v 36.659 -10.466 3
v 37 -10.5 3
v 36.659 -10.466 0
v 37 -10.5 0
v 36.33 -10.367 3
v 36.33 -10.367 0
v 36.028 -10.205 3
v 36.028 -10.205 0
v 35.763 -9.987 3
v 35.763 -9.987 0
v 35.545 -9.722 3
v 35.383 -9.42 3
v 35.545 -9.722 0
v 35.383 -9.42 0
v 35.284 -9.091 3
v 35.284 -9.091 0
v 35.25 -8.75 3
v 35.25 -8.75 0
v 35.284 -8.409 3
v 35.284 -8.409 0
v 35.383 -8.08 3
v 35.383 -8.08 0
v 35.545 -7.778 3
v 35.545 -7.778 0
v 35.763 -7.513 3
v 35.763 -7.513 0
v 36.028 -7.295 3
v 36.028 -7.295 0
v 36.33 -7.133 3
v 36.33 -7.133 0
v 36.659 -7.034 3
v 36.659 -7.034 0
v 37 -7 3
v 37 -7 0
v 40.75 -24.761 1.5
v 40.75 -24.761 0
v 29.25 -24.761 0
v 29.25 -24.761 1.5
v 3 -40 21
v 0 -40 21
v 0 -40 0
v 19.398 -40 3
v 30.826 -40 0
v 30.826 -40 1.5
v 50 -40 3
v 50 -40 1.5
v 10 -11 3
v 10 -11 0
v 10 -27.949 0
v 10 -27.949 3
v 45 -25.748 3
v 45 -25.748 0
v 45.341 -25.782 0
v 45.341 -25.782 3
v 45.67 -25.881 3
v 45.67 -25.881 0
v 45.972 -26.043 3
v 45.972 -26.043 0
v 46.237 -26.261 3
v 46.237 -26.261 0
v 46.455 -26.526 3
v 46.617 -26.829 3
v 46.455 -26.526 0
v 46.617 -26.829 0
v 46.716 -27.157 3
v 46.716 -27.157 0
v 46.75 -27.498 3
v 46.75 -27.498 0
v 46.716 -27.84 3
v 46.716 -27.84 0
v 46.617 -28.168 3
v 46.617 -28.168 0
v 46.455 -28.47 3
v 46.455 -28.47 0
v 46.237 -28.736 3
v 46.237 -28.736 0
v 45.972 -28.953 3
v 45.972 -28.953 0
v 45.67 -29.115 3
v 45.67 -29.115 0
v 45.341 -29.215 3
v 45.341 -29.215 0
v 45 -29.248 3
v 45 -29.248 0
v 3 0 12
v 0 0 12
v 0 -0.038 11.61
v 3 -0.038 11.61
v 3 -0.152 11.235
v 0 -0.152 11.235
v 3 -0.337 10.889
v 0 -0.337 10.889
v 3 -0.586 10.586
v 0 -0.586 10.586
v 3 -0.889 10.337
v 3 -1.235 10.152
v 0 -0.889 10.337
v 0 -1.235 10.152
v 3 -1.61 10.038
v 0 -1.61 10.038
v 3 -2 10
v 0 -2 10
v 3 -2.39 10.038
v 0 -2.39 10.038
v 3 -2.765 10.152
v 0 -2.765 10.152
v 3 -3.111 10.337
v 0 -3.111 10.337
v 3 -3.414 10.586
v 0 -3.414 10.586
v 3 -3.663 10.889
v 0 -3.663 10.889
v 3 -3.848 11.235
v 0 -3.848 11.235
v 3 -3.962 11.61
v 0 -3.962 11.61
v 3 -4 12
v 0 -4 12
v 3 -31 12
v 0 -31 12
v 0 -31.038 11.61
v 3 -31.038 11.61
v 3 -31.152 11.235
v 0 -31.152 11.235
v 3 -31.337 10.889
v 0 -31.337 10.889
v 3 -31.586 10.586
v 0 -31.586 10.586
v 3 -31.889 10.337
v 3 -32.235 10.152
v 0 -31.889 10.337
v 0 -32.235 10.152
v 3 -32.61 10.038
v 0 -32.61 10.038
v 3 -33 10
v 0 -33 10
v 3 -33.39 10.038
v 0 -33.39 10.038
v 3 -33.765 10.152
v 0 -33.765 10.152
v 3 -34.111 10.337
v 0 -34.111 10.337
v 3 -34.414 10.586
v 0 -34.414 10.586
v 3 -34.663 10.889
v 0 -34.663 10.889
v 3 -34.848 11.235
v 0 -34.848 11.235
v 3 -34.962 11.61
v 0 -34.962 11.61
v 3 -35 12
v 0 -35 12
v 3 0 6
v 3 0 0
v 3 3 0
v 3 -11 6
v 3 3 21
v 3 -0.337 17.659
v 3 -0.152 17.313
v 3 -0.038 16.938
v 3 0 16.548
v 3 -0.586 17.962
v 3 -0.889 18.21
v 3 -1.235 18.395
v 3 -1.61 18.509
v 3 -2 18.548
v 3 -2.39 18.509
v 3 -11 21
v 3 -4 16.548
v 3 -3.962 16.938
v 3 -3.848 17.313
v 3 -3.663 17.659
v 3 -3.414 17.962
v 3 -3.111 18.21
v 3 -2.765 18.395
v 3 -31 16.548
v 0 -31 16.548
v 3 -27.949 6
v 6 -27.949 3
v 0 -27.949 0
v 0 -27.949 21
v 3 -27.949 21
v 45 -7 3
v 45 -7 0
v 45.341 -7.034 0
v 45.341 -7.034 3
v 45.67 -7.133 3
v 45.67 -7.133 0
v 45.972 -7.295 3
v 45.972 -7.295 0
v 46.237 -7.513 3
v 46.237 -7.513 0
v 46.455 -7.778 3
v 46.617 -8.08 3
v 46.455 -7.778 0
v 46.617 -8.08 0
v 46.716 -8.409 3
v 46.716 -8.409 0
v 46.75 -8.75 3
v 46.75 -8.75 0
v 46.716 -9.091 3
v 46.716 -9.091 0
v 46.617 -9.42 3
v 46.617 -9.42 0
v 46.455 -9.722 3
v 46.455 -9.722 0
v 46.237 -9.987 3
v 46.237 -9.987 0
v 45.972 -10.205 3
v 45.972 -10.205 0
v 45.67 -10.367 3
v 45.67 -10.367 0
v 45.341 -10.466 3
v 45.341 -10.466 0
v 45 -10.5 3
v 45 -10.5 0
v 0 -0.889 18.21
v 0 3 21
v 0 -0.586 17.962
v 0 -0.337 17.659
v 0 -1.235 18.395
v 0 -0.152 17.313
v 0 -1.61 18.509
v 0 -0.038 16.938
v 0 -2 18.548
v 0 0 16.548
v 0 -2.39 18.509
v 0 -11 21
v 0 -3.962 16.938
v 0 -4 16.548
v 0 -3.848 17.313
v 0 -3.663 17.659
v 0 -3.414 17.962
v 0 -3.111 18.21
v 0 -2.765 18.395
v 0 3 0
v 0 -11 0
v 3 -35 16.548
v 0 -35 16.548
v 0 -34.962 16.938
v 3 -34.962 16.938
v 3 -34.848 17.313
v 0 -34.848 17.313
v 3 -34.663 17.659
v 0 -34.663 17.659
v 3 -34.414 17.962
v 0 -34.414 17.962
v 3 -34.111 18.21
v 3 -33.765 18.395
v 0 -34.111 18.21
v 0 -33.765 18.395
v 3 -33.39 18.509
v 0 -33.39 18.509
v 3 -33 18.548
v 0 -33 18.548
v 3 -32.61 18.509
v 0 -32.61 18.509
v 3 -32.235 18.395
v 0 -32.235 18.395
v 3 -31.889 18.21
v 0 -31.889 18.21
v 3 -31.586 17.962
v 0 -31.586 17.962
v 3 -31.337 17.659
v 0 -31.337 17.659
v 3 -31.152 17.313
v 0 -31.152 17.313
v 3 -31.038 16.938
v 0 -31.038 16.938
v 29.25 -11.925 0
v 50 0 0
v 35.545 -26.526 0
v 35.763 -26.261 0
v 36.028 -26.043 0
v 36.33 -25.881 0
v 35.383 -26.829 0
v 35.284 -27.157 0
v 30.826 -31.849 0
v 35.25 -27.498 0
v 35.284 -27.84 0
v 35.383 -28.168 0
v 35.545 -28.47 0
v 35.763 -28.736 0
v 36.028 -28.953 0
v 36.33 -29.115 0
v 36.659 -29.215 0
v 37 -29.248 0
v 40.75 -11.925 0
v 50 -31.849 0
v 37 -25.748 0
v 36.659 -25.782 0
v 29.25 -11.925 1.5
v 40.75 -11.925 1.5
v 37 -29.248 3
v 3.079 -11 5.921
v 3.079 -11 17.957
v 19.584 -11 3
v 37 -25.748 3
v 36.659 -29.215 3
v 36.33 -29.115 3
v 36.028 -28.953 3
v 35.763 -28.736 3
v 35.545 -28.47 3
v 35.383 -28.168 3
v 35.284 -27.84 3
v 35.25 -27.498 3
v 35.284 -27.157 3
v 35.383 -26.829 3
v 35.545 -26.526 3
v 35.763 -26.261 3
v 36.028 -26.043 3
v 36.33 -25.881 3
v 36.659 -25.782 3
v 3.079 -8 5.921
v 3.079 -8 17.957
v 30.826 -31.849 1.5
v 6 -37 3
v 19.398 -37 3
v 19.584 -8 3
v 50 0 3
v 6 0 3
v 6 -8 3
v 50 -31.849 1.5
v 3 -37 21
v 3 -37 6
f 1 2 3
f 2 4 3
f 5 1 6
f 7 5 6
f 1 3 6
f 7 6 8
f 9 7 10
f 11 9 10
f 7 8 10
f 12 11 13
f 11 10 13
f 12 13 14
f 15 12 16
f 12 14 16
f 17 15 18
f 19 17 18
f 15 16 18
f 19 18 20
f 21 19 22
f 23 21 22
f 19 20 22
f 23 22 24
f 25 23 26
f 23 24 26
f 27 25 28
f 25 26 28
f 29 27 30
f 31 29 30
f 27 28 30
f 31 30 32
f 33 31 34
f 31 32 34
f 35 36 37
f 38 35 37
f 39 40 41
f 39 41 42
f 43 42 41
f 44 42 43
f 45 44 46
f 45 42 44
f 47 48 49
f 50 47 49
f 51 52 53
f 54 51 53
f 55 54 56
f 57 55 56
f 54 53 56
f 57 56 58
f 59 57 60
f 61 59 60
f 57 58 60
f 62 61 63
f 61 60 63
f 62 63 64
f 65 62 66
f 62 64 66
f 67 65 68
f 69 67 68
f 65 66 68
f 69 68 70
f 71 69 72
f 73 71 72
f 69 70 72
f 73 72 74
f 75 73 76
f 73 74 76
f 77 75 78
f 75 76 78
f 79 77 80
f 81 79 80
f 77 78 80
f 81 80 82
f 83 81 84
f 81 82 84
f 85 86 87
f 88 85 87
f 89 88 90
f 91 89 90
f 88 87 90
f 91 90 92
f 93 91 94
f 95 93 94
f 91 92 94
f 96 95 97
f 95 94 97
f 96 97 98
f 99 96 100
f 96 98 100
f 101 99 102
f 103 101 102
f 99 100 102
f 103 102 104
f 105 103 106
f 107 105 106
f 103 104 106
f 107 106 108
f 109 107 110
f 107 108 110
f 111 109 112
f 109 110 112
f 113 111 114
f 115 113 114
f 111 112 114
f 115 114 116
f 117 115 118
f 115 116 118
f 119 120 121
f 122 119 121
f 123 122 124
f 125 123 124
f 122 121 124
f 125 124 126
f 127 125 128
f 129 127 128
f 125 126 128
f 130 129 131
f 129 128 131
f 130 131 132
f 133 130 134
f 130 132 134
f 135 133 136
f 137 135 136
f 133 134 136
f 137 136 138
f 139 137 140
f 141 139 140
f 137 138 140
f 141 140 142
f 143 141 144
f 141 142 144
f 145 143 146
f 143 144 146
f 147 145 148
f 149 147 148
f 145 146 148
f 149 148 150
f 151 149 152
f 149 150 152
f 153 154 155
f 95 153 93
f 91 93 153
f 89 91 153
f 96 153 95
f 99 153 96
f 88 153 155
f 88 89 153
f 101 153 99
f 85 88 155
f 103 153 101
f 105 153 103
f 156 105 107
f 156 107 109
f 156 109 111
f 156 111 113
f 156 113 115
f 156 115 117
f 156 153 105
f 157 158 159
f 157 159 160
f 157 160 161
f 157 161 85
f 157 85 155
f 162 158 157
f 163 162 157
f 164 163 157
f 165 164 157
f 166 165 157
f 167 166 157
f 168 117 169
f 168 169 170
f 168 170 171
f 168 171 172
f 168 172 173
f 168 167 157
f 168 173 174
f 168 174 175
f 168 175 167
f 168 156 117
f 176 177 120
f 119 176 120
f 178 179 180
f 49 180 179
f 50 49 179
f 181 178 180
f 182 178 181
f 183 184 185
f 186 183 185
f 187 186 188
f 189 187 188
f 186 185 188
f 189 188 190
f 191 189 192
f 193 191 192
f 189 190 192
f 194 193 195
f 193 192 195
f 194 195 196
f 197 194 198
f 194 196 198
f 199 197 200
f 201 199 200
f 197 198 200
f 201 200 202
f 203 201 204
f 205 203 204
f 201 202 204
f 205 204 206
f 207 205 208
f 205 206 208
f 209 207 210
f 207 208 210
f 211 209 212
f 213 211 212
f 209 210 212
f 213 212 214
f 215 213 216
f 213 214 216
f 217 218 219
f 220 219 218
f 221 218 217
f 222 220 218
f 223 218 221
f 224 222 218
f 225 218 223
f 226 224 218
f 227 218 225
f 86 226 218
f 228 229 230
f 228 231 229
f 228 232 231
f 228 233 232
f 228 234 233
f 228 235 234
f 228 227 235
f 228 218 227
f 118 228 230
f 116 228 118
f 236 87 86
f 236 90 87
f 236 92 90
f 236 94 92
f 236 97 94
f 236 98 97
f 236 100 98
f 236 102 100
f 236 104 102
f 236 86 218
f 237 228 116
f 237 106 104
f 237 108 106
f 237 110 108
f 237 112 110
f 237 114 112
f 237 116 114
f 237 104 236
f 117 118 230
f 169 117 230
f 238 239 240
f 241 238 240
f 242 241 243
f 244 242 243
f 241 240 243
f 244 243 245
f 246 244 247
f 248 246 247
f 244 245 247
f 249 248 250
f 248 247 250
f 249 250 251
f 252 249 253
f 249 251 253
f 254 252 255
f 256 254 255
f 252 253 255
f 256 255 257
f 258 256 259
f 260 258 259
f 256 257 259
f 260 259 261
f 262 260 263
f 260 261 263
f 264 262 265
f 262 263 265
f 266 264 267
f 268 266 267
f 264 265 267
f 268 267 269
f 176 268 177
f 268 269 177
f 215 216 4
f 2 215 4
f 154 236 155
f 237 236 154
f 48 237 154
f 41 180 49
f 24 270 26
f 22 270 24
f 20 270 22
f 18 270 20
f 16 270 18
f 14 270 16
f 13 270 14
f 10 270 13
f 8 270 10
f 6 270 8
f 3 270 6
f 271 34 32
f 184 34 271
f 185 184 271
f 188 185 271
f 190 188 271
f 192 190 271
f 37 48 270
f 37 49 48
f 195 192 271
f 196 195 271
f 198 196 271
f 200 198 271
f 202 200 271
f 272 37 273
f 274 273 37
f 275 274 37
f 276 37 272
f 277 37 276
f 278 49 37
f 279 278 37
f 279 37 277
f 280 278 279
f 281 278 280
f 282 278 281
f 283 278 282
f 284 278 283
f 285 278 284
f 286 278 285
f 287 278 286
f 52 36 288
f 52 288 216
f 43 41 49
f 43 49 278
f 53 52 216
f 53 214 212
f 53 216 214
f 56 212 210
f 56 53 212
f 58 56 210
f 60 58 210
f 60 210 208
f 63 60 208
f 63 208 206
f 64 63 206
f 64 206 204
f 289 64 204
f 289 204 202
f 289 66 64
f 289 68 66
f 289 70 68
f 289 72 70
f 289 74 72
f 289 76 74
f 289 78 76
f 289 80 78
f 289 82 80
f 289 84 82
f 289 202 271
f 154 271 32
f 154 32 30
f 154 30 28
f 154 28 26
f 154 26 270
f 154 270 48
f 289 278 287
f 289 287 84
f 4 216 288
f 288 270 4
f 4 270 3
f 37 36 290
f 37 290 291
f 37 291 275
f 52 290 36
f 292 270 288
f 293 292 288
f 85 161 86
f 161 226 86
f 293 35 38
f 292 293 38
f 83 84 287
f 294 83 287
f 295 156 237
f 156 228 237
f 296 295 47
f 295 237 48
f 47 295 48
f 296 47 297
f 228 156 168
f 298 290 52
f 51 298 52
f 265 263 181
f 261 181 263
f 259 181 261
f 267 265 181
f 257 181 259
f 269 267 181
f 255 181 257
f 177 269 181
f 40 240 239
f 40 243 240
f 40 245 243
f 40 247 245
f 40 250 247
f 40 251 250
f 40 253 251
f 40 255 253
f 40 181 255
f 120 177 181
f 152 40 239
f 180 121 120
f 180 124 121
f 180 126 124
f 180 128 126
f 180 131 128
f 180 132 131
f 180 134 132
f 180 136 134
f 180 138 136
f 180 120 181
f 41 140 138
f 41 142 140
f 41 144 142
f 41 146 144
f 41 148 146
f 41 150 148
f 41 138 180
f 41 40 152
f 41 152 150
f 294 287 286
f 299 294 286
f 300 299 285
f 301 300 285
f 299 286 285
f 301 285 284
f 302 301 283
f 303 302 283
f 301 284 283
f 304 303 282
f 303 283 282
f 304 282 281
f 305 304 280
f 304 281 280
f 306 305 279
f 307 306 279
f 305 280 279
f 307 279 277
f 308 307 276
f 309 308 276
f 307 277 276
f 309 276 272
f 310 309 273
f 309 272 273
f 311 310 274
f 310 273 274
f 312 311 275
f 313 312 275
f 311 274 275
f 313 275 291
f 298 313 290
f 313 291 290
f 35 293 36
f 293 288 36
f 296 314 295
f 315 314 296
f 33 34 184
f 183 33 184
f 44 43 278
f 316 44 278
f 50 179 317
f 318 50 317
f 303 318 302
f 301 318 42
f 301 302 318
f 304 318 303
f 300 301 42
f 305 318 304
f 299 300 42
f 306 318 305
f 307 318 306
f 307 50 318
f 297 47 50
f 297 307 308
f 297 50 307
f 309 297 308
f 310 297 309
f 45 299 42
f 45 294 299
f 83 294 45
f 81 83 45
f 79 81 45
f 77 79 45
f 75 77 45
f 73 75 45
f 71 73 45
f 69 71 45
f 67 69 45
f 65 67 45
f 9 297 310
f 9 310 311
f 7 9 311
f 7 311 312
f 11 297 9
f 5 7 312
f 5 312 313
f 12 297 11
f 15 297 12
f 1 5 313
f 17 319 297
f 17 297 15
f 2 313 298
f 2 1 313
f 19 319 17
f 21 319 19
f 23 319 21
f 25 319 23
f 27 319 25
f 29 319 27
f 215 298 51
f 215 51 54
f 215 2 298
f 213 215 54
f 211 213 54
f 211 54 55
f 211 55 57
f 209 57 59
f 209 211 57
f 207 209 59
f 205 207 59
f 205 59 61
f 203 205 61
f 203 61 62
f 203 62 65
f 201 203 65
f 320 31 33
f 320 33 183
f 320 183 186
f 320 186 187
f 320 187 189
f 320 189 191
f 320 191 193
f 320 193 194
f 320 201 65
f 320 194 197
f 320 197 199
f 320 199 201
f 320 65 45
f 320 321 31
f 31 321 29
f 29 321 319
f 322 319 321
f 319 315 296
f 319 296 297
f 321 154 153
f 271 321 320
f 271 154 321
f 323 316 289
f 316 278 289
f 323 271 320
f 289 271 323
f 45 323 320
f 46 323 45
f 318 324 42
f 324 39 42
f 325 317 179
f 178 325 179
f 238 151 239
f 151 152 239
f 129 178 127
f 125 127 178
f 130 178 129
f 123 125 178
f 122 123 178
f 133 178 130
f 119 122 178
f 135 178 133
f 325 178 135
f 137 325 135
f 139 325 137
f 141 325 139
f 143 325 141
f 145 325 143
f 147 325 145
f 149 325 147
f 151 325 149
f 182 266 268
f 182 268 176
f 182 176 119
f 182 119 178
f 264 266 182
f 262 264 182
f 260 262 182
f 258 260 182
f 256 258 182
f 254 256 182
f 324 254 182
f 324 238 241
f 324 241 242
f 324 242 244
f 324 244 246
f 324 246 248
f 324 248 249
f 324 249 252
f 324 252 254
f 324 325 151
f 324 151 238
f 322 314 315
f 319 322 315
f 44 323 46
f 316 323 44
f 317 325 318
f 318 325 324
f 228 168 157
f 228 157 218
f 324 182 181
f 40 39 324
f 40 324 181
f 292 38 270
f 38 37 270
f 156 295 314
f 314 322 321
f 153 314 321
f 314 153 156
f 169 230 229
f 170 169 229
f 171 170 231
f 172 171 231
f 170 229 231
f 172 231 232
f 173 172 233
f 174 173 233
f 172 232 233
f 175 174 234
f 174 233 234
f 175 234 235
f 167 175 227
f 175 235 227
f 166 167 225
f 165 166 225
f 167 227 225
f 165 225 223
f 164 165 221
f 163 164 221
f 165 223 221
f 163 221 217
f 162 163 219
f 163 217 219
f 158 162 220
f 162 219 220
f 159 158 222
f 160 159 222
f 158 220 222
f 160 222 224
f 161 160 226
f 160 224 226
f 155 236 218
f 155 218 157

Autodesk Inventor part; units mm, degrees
ref_plane "YZ Plane" through (0, 0, 0) normal (1, 0, 0) x (0, 1, 0)
ref_plane "XZ Plane" through (0, 0, 0) normal (0, 1, 0) x (-1, 0, 0)
ref_plane "XY Plane" through (0, 0, 0) normal (0, 0, 1) x (1, 0, 0)
sketch "Sketch1" plane through (0, 0, 0) normal (0, 0, 1) x (1, 0, 0)
  line L0 (0, 0) -> (50, 0)
  line L1 (50, 0) -> (50, -40)
  line L2 (50, -40) -> (0, -40)
  line L3 (0, -40) -> (0, 0)
  dimension "d0" = 50
  dimension "d1" = 40
extrude "Extrusion1" add sketch "Sketch1" along normal blind 3
sketch "Sketch2" plane through (0, 0, 3) normal (0, 0, 1) x (1, 0, 0)
  line L0 (0, -40) -> (50, -40) projected
  line L1 (0, 0) -> (3, 0)
  line L2 (3, 0) -> (3, -40)
  line L3 (3, -40) -> (0, -40)
  line L4 (0, -40) -> (0, 0)
  dimension "d4" = 3
extrude "Extrusion2" add sketch "Sketch2" along normal blind 18
sketch "Sketch3" plane through (0, 0, 0) normal (0, 1, 0) x (1, 0, 0)
  line L0 (0, 0) -> (3, 0)
  line L1 (3, 0) -> (3, -21)
  line L2 (3, -21) -> (0, -21)
  line L3 (0, -21) -> (0, 0)
extrude "Extrusion3" add sketch "Sketch3" along normal blind 3
sketch "Sketch4" plane through (0, 0, 0) normal (0, 0, -1) x (-1, 0, 0)
  line L0 (0, -40) -> (0, 3) projected
  line L1 (-3, 0) -> (-3, 3) projected
  line L2 (-3, 0) -> (-3, -11)
  line L3 (0, -11) -> (-10, -11)
  line L4 (-10, -11) -> (-10, -27.9486)
  line L5 (-10, -27.9486) -> (0, -27.9486)
  point P0 (0, 0)
  dimension "d9" = 11
  dimension "d10" = 10
extrude "Extrusion4" cut sketch "Sketch4" against normal blind 8
sketch "Sketch6" plane through (0, -40, 0) normal (-1, 0, 0) x (0, 0, 1)
  line L0 (0, 29) -> (8, 29) projected
  line L1 (12, 38) -> (16.5475, 38) construction
  line L2 (12, 36) -> (16.5475, 36)
  line L3 (16.5475, 40) -> (12, 40)
  arc A0 (12, 40) -> (12, 36) centre (12, 38) ccw
  arc A1 (16.5475, 36) -> (16.5475, 40) centre (16.5475, 38) ccw
  point P0 (0, 40)
  point P1 (14.2738, 38)
extrude "Extrusion6" cut sketch "Sketch6" against normal through all
sketch "Sketch7" plane through (0, -40, 0) normal (-1, 0, 0) x (0, 0, 1)
  line L0 (16.5475, 36) -> (12, 36) projected
  line L1 (12, 7) -> (16.5475, 7) construction
  line L2 (12, 5) -> (16.5475, 5)
  line L3 (16.5475, 9) -> (12, 9)
  arc A0 (12, 9) -> (12, 5) centre (12, 7) ccw
  arc A1 (16.5475, 5) -> (16.5475, 9) centre (16.5475, 7) ccw
  point P0 (0, 40)
  point P1 (14.2738, 7)
  dimension "d67" = 4
extrude "Extrusion7" cut sketch "Sketch7" against normal through all
sketch "Sketch8" plane through (0, 0, 0) normal (0, 0, -1) x (-1, 0, 0)
  line L0 (-45, -8.75) -> (-37, -8.75) construction
  line L1 (-45, -10.5) -> (-37, -10.5)
  line L2 (-37, -7) -> (-45, -7)
  arc A0 (-45, -7) -> (-45, -10.5) centre (-45, -8.75) ccw
  arc A1 (-37, -10.5) -> (-37, -7) centre (-37, -8.75) ccw
  line L3 (-10, -27.9486) -> (-10, -11) projected
  line L4 (-41, -8.75) -> (-41, -4.75) construction
  line L5 (-41, -4.75) -> (-35.5779, -4.75) construction
  point P0 (0, 0)
  dimension "d27" = 8
  dimension "d28" = 3.5
  dimension "d60" = 4
extrude "Extrusion8" cut sketch "Sketch8" against normal through all
chamfer "Chamfer1" distance 3 angle 45 1 edges at (3, -33.9743, 3)
chamfer "Chamfer2" distance 3 angle 45 1 edges at (3, -5.5, 3)
sketch "Sketch11" plane through (0, 0, 0) normal (0, 0, -1) x (-1, 0, 0)
  line L0 (-10, -27.9486) -> (-10, -11) projected
  line L1 (-41.0188, 5.0018) -> (-41.0188, -13.9982) construction
  line L2 (-48.6932, -22.9665) -> (-25.0226, -22.9665) construction
  line L3 (-45, -41.7147) -> (-45, -21.8236) construction
  line L4 (-37, -41.7147) -> (-37, -21.8236) construction
  line L5 (-45, -22.9665) -> (-37, -22.9665) construction
  line L6 (-45, -29.2482) -> (-37, -29.2482)
  arc A0 (-45, -25.7482) -> (-45, -29.2482) centre (-45, -27.4982) ccw
  arc A1 (-37, -29.2482) -> (-37, -25.7482) centre (-37, -27.4982) ccw
  line L7 (0, -27.9486) -> (-10, -27.9486) projected
  line L8 (-41.0188, -8.7165) -> (-41.0188, -4.7165)
  line L9 (-41.0188, -4.7165) -> (-38.5918, -4.7165)
  line L10 (0, -40) -> (0, -27.9486) projected
  line L11 (-41.0188, 5.7518) -> (-41.0188, -13.2482) construction
  line L12 (-41.0188, -27.7165) -> (-56.6295, -27.7165) construction
  line L13 (-37, -25.7482) -> (-45, -25.7482)
  point P0 (0, 0)
  point P1 (-41, -22.9665)
  dimension "d43" = 19
  dimension "d44" = 3.5
  dimension "d59" = 4
  dimension "d61" = 19
extrude "Extrusion11" cut sketch "Sketch11" against normal through all
sketch "Sketch12" plane through (0, 0, 0) normal (0, 0, -1) x (-1, 0, 0)
  line L0 (-10, -27.9486) -> (-10, -11) projected
  line L1 (-41, -25.8493) -> (-41, -31.8493) construction
  line L2 (-41, -31.8493) -> (-30.8265, -31.8493) construction
  line L3 (-30.8265, -31.8493) -> (-30.8265, -35.8493) construction
  line L4 (-30.8265, -35.8493) -> (-30.8265, -31.8493) construction
  line L5 (-30.8265, -31.8493) -> (-50, -31.8493)
  line L6 (-50, -31.8493) -> (-50, -40)
  line L7 (-50, -40) -> (-30.8265, -40)
  line L8 (-30.8265, -40) -> (-30.8265, -31.8493)
  point P0 (0, 0)
  dimension "d47" = 6
  dimension "d48" = 4
  dimension "d49" = 4
extrude "Extrusion12" cut sketch "Sketch12" against normal blind 1.5
sketch "Sketch13" plane through (0, 0, 0) normal (0, 0, -1) x (-1, 0, 0)
  line L0 (-45, -21.2165) -> (-37, -21.2165) projected
  arc A0 (-37, -10.5) -> (-37, -7) centre (-37, -8.75) ccw projected
  arc A1 (-45, -7) -> (-45, -10.5) centre (-45, -8.75) ccw projected
  line L1 (-45, -7) -> (-37, -7) projected
  line L2 (-46.75, -8.75) -> (-40.75, -8.75) construction
  line L3 (-40.75, -8.75) -> (-40.75, -24.7606) construction
  line L4 (-40.75, -24.7606) -> (-37.75, -24.7606) construction
  line L5 (-37.75, -11.2484) -> (-40.75, -11.2484) construction
  line L6 (-35.25, -8.75) -> (-29.25, -8.75) construction
  line L7 (-29.25, -8.75) -> (-29.25, -11.925) construction
  line L8 (-40.8665, -21.2165) -> (-40.75, -19.2199) construction
  line L9 (-29.25, -11.925) -> (-40.75, -11.925)
  line L10 (-40.75, -11.925) -> (-40.75, -24.7606)
  line L11 (-40.75, -24.7606) -> (-29.25, -24.7606)
  line L12 (-29.25, -24.7606) -> (-29.25, -11.925)
  point P0 (0, 0)
  point P1 (-40.75, -11.925)
  dimension "d52" = 6
  dimension "d53" = 3
  dimension "d54" = 6
  dimension "d55" = 3.175
  dimension "d56" = 2
extrude "Extrusion13" cut sketch "Sketch13" against normal blind 1.5
ref_plane "Work Plane1" through (0, -8, 0) normal (0, 1, 0) x (1, 0, 0)
sketch "Sketch14" plane through (0, -8, 0) normal (0, 1, 0) x (1, 0, 0)
  line L0 (3.0794, -17.957) -> (19.7008, -2.8939)
  line L1 (19.7008, -2.8939) -> (3.0794, -2.8939)
  line L2 (3.0794, -2.8939) -> (3.0794, -17.957)
  point P0 (0, 0)
extrude "Extrusion14" add sketch "Sketch14" against normal blind 3
sketch "Sketch15" plane through (0, -40, 21) normal (0, -1, 0) x (1, 0, 0)
  line L0 (6, -18) -> (50, -18) projected
  line L1 (3, -15) -> (6, -18) projected
  line L2 (3, -15) -> (3, 0) projected
  line L3 (3, 0) -> (19.3977, -18)
  line L4 (3, -15.75) -> (3, 0)
extrude "Extrusion15" add sketch "Sketch15" against normal blind 3
sketch "Sketch16" plane through (3, 0, 0) normal (1, 0, 0) x (0, 0, -1)
  line L0 (-21, -37) -> (-21, 3) projected
  line L1 (-21, -11) -> (-8, -11)
  line L2 (-8, -11) -> (-8, -27.9486)
  line L3 (-8, -27.9486) -> (-21, -27.9486)
  line L4 (-21, -27.9486) -> (-21, -11)
extrude "Extrusion16" cut sketch "Sketch16" against normal through all
properties part number "bart z endstop bracket v12"
